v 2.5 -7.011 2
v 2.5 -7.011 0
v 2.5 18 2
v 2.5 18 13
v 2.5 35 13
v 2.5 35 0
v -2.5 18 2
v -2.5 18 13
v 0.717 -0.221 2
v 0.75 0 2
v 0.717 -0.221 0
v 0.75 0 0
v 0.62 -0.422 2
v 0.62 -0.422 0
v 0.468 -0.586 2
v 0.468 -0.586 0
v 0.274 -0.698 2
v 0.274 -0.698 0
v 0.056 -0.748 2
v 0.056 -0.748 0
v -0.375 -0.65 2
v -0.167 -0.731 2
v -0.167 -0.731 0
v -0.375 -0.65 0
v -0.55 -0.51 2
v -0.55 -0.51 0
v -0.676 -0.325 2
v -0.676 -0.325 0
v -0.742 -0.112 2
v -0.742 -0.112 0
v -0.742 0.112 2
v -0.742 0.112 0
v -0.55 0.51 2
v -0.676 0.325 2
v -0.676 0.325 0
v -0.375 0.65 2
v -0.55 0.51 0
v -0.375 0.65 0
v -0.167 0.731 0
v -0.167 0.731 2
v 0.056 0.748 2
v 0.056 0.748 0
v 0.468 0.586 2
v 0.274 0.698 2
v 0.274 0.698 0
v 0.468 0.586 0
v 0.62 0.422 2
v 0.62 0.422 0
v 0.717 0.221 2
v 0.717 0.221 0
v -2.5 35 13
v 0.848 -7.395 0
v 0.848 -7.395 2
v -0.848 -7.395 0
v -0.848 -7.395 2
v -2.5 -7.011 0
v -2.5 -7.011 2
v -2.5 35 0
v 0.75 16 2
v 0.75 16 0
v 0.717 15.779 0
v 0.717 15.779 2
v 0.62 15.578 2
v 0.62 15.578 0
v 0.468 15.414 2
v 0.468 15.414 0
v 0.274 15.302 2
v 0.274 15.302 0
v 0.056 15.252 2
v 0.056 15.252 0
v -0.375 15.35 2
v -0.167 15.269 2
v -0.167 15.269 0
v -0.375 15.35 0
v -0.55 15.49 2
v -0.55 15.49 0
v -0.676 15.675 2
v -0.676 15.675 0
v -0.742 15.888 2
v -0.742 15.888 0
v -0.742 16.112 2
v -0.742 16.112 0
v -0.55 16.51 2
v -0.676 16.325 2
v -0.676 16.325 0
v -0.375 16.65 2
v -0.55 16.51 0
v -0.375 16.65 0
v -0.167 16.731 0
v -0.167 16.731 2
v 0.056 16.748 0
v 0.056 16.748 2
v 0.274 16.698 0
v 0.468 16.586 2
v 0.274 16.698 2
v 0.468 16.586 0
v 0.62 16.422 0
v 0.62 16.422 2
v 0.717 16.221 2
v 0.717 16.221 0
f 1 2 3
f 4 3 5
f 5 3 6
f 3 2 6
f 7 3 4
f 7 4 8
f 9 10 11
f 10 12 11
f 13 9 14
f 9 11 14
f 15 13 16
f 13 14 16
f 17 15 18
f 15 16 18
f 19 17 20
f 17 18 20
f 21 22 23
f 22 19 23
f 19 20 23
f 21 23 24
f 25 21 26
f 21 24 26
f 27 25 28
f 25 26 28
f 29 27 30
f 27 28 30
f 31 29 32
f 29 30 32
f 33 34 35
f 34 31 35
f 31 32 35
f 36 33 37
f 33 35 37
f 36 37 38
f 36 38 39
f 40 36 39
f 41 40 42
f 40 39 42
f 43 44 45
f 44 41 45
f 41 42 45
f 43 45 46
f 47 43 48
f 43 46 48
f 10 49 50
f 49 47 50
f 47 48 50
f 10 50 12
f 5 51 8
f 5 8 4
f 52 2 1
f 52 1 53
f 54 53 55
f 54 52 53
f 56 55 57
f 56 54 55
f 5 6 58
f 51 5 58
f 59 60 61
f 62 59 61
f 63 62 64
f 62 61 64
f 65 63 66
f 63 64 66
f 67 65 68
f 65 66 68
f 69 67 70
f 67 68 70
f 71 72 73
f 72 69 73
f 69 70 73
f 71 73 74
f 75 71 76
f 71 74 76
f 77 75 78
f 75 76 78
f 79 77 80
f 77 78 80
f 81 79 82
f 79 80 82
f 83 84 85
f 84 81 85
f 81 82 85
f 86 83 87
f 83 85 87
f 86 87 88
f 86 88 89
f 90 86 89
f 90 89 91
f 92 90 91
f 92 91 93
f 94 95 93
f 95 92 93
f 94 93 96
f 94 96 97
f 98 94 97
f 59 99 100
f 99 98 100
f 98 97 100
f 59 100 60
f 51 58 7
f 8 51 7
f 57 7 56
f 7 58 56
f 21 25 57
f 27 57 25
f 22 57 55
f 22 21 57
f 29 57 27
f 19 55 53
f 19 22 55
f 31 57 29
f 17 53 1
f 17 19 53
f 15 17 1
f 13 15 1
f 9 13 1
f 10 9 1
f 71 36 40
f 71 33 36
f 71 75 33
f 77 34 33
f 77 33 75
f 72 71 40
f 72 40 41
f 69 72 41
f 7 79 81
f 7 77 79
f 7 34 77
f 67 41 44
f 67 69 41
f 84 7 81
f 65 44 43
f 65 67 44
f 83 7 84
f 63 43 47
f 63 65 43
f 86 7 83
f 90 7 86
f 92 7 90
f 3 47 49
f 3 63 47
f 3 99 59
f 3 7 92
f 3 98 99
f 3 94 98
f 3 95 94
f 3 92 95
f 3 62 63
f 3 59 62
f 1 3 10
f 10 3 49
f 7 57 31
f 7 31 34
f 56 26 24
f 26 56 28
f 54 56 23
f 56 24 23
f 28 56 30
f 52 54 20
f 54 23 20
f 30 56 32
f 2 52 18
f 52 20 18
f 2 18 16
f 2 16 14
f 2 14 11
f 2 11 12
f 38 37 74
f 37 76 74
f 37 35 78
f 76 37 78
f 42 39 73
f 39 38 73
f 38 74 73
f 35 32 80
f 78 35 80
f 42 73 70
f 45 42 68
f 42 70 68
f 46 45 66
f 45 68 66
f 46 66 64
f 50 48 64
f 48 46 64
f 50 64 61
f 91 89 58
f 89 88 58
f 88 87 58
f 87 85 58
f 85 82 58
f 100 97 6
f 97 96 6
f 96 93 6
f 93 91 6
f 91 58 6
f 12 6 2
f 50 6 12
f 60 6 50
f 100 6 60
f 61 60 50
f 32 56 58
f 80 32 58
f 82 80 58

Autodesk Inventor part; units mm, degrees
ref_plane "YZ Plane" through (0, 0, 0) normal (1, 0, 0) x (0, 1, 0)
ref_plane "XZ Plane" through (0, 0, 0) normal (0, 1, 0) x (-1, 0, 0)
ref_plane "XY Plane" through (0, 0, 0) normal (0, 0, 1) x (1, 0, 0)
sketch "Sketch1" plane through (0, 0, 0) normal (0, 0, 1) x (1, 0, 0)
  line L0 (-2.5, -35.0001) -> (2.5, -35.0001)
  line L1 (2.8921, 7.4595) -> (4.1309, 9.1069)
  line L2 (-2.8882, 7.4611) -> (-3.0825, 9.5131)
  line L3 (-3.0825, 9.5131) -> (-5.3884, 5.9139)
  line L4 (-5.3884, 5.9139) -> (-6.3108, 7.7572)
  line L5 (-6.3108, 7.7572) -> (-7.1609, 3.5681)
  line L6 (-7.1609, 3.5681) -> (-8.6869, 4.9536)
  line L7 (-8.6869, 4.9536) -> (-7.9662, 0.7403)
  line L8 (-7.9662, 0.7403) -> (-9.8897, 1.481)
  line L9 (-9.8897, 1.481) -> (-7.6957, -2.1874)
  line L10 (-7.6957, -2.1874) -> (-9.7569, -2.1916)
  line L11 (-9.7569, -2.1916) -> (-6.3859, -4.8197)
  line L12 (-6.3859, -4.8197) -> (-8.3064, -5.5682)
  line L13 (-8.3064, -5.5682) -> (-4.2136, -6.8011)
  line L14 (-4.2136, -6.8011) -> (-5.734, -8.1928)
  line L15 (-5.734, -8.1928) -> (-1.4722, -7.864)
  line L16 (-1.4722, -7.864) -> (-2.3872, -9.7109)
  line L17 (-2.3872, -9.7109) -> (1.468, -7.8647)
  line L18 (1.468, -7.8647) -> (1.282, -9.9175)
  line L19 (1.282, -9.9175) -> (4.21, -6.8033)
  line L20 (4.21, -6.8033) -> (4.778, -8.7847)
  line L21 (4.778, -8.7847) -> (6.3833, -4.8231)
  line L22 (6.3833, -4.8231) -> (7.6287, -6.4655)
  line L23 (7.6287, -6.4655) -> (7.6946, -2.1915)
  line L24 (7.6946, -2.1915) -> (9.4492, -3.273)
  line L25 (9.4492, -3.273) -> (7.9666, 0.7361)
  line L26 (7.9666, 0.7361) -> (9.9935, 0.3614)
  line L27 (9.9935, 0.3614) -> (7.1628, 3.5643)
  line L28 (7.1628, 3.5643) -> (9.1881, 3.9471)
  line L29 (9.1881, 3.9471) -> (5.3915, 5.9111)
  line L30 (5.3915, 5.9111) -> (7.1418, 6.9996)
  line L31 (7.1418, 6.9996) -> (2.8921, 7.4595)
  line L32 (-2.5, -35) -> (2.5, -35)
  line L33 (2.5, 35) -> (-2.5, 35)
  arc A0 (-2.5, -7.011) -> (2.5, -7.011) centre (0, 0) ccw
  line L34 (2.5, -7.011) -> (2.5, 35)
  line L35 (-2.5, 35) -> (-2.5, -7.011)
  circle A1 centre (0, 16) radius 0.75
  circle A2 centre (0, 0) radius 0.75
  dimension "d3" = 5
  dimension "d5" = 1.5
  dimension "d6" = 1.5
extrude "Extrusion1" add sketch "Sketch1" along normal blind 2
sketch "Sketch2" plane through (0, 0, 2) normal (0, 0, 1) x (1, 0, 0)
  circle A0 centre (0, 0) radius 0.75 projected
  line L0 (2.5, 18) -> (2.5, 35)
  line L1 (2.5, 35) -> (-2.5, 35)
  line L2 (-2.5, 35) -> (-2.5, 18)
  line L3 (2.5, 18) -> (-2.5, 18)
  line L4 (-2.5, 35) -> (-2.5, -7.011) projected
extrude "Extrusion2" add sketch "Sketch2" along normal blind 11 contours L3 L2 L1 L0
properties part number "Valve"
